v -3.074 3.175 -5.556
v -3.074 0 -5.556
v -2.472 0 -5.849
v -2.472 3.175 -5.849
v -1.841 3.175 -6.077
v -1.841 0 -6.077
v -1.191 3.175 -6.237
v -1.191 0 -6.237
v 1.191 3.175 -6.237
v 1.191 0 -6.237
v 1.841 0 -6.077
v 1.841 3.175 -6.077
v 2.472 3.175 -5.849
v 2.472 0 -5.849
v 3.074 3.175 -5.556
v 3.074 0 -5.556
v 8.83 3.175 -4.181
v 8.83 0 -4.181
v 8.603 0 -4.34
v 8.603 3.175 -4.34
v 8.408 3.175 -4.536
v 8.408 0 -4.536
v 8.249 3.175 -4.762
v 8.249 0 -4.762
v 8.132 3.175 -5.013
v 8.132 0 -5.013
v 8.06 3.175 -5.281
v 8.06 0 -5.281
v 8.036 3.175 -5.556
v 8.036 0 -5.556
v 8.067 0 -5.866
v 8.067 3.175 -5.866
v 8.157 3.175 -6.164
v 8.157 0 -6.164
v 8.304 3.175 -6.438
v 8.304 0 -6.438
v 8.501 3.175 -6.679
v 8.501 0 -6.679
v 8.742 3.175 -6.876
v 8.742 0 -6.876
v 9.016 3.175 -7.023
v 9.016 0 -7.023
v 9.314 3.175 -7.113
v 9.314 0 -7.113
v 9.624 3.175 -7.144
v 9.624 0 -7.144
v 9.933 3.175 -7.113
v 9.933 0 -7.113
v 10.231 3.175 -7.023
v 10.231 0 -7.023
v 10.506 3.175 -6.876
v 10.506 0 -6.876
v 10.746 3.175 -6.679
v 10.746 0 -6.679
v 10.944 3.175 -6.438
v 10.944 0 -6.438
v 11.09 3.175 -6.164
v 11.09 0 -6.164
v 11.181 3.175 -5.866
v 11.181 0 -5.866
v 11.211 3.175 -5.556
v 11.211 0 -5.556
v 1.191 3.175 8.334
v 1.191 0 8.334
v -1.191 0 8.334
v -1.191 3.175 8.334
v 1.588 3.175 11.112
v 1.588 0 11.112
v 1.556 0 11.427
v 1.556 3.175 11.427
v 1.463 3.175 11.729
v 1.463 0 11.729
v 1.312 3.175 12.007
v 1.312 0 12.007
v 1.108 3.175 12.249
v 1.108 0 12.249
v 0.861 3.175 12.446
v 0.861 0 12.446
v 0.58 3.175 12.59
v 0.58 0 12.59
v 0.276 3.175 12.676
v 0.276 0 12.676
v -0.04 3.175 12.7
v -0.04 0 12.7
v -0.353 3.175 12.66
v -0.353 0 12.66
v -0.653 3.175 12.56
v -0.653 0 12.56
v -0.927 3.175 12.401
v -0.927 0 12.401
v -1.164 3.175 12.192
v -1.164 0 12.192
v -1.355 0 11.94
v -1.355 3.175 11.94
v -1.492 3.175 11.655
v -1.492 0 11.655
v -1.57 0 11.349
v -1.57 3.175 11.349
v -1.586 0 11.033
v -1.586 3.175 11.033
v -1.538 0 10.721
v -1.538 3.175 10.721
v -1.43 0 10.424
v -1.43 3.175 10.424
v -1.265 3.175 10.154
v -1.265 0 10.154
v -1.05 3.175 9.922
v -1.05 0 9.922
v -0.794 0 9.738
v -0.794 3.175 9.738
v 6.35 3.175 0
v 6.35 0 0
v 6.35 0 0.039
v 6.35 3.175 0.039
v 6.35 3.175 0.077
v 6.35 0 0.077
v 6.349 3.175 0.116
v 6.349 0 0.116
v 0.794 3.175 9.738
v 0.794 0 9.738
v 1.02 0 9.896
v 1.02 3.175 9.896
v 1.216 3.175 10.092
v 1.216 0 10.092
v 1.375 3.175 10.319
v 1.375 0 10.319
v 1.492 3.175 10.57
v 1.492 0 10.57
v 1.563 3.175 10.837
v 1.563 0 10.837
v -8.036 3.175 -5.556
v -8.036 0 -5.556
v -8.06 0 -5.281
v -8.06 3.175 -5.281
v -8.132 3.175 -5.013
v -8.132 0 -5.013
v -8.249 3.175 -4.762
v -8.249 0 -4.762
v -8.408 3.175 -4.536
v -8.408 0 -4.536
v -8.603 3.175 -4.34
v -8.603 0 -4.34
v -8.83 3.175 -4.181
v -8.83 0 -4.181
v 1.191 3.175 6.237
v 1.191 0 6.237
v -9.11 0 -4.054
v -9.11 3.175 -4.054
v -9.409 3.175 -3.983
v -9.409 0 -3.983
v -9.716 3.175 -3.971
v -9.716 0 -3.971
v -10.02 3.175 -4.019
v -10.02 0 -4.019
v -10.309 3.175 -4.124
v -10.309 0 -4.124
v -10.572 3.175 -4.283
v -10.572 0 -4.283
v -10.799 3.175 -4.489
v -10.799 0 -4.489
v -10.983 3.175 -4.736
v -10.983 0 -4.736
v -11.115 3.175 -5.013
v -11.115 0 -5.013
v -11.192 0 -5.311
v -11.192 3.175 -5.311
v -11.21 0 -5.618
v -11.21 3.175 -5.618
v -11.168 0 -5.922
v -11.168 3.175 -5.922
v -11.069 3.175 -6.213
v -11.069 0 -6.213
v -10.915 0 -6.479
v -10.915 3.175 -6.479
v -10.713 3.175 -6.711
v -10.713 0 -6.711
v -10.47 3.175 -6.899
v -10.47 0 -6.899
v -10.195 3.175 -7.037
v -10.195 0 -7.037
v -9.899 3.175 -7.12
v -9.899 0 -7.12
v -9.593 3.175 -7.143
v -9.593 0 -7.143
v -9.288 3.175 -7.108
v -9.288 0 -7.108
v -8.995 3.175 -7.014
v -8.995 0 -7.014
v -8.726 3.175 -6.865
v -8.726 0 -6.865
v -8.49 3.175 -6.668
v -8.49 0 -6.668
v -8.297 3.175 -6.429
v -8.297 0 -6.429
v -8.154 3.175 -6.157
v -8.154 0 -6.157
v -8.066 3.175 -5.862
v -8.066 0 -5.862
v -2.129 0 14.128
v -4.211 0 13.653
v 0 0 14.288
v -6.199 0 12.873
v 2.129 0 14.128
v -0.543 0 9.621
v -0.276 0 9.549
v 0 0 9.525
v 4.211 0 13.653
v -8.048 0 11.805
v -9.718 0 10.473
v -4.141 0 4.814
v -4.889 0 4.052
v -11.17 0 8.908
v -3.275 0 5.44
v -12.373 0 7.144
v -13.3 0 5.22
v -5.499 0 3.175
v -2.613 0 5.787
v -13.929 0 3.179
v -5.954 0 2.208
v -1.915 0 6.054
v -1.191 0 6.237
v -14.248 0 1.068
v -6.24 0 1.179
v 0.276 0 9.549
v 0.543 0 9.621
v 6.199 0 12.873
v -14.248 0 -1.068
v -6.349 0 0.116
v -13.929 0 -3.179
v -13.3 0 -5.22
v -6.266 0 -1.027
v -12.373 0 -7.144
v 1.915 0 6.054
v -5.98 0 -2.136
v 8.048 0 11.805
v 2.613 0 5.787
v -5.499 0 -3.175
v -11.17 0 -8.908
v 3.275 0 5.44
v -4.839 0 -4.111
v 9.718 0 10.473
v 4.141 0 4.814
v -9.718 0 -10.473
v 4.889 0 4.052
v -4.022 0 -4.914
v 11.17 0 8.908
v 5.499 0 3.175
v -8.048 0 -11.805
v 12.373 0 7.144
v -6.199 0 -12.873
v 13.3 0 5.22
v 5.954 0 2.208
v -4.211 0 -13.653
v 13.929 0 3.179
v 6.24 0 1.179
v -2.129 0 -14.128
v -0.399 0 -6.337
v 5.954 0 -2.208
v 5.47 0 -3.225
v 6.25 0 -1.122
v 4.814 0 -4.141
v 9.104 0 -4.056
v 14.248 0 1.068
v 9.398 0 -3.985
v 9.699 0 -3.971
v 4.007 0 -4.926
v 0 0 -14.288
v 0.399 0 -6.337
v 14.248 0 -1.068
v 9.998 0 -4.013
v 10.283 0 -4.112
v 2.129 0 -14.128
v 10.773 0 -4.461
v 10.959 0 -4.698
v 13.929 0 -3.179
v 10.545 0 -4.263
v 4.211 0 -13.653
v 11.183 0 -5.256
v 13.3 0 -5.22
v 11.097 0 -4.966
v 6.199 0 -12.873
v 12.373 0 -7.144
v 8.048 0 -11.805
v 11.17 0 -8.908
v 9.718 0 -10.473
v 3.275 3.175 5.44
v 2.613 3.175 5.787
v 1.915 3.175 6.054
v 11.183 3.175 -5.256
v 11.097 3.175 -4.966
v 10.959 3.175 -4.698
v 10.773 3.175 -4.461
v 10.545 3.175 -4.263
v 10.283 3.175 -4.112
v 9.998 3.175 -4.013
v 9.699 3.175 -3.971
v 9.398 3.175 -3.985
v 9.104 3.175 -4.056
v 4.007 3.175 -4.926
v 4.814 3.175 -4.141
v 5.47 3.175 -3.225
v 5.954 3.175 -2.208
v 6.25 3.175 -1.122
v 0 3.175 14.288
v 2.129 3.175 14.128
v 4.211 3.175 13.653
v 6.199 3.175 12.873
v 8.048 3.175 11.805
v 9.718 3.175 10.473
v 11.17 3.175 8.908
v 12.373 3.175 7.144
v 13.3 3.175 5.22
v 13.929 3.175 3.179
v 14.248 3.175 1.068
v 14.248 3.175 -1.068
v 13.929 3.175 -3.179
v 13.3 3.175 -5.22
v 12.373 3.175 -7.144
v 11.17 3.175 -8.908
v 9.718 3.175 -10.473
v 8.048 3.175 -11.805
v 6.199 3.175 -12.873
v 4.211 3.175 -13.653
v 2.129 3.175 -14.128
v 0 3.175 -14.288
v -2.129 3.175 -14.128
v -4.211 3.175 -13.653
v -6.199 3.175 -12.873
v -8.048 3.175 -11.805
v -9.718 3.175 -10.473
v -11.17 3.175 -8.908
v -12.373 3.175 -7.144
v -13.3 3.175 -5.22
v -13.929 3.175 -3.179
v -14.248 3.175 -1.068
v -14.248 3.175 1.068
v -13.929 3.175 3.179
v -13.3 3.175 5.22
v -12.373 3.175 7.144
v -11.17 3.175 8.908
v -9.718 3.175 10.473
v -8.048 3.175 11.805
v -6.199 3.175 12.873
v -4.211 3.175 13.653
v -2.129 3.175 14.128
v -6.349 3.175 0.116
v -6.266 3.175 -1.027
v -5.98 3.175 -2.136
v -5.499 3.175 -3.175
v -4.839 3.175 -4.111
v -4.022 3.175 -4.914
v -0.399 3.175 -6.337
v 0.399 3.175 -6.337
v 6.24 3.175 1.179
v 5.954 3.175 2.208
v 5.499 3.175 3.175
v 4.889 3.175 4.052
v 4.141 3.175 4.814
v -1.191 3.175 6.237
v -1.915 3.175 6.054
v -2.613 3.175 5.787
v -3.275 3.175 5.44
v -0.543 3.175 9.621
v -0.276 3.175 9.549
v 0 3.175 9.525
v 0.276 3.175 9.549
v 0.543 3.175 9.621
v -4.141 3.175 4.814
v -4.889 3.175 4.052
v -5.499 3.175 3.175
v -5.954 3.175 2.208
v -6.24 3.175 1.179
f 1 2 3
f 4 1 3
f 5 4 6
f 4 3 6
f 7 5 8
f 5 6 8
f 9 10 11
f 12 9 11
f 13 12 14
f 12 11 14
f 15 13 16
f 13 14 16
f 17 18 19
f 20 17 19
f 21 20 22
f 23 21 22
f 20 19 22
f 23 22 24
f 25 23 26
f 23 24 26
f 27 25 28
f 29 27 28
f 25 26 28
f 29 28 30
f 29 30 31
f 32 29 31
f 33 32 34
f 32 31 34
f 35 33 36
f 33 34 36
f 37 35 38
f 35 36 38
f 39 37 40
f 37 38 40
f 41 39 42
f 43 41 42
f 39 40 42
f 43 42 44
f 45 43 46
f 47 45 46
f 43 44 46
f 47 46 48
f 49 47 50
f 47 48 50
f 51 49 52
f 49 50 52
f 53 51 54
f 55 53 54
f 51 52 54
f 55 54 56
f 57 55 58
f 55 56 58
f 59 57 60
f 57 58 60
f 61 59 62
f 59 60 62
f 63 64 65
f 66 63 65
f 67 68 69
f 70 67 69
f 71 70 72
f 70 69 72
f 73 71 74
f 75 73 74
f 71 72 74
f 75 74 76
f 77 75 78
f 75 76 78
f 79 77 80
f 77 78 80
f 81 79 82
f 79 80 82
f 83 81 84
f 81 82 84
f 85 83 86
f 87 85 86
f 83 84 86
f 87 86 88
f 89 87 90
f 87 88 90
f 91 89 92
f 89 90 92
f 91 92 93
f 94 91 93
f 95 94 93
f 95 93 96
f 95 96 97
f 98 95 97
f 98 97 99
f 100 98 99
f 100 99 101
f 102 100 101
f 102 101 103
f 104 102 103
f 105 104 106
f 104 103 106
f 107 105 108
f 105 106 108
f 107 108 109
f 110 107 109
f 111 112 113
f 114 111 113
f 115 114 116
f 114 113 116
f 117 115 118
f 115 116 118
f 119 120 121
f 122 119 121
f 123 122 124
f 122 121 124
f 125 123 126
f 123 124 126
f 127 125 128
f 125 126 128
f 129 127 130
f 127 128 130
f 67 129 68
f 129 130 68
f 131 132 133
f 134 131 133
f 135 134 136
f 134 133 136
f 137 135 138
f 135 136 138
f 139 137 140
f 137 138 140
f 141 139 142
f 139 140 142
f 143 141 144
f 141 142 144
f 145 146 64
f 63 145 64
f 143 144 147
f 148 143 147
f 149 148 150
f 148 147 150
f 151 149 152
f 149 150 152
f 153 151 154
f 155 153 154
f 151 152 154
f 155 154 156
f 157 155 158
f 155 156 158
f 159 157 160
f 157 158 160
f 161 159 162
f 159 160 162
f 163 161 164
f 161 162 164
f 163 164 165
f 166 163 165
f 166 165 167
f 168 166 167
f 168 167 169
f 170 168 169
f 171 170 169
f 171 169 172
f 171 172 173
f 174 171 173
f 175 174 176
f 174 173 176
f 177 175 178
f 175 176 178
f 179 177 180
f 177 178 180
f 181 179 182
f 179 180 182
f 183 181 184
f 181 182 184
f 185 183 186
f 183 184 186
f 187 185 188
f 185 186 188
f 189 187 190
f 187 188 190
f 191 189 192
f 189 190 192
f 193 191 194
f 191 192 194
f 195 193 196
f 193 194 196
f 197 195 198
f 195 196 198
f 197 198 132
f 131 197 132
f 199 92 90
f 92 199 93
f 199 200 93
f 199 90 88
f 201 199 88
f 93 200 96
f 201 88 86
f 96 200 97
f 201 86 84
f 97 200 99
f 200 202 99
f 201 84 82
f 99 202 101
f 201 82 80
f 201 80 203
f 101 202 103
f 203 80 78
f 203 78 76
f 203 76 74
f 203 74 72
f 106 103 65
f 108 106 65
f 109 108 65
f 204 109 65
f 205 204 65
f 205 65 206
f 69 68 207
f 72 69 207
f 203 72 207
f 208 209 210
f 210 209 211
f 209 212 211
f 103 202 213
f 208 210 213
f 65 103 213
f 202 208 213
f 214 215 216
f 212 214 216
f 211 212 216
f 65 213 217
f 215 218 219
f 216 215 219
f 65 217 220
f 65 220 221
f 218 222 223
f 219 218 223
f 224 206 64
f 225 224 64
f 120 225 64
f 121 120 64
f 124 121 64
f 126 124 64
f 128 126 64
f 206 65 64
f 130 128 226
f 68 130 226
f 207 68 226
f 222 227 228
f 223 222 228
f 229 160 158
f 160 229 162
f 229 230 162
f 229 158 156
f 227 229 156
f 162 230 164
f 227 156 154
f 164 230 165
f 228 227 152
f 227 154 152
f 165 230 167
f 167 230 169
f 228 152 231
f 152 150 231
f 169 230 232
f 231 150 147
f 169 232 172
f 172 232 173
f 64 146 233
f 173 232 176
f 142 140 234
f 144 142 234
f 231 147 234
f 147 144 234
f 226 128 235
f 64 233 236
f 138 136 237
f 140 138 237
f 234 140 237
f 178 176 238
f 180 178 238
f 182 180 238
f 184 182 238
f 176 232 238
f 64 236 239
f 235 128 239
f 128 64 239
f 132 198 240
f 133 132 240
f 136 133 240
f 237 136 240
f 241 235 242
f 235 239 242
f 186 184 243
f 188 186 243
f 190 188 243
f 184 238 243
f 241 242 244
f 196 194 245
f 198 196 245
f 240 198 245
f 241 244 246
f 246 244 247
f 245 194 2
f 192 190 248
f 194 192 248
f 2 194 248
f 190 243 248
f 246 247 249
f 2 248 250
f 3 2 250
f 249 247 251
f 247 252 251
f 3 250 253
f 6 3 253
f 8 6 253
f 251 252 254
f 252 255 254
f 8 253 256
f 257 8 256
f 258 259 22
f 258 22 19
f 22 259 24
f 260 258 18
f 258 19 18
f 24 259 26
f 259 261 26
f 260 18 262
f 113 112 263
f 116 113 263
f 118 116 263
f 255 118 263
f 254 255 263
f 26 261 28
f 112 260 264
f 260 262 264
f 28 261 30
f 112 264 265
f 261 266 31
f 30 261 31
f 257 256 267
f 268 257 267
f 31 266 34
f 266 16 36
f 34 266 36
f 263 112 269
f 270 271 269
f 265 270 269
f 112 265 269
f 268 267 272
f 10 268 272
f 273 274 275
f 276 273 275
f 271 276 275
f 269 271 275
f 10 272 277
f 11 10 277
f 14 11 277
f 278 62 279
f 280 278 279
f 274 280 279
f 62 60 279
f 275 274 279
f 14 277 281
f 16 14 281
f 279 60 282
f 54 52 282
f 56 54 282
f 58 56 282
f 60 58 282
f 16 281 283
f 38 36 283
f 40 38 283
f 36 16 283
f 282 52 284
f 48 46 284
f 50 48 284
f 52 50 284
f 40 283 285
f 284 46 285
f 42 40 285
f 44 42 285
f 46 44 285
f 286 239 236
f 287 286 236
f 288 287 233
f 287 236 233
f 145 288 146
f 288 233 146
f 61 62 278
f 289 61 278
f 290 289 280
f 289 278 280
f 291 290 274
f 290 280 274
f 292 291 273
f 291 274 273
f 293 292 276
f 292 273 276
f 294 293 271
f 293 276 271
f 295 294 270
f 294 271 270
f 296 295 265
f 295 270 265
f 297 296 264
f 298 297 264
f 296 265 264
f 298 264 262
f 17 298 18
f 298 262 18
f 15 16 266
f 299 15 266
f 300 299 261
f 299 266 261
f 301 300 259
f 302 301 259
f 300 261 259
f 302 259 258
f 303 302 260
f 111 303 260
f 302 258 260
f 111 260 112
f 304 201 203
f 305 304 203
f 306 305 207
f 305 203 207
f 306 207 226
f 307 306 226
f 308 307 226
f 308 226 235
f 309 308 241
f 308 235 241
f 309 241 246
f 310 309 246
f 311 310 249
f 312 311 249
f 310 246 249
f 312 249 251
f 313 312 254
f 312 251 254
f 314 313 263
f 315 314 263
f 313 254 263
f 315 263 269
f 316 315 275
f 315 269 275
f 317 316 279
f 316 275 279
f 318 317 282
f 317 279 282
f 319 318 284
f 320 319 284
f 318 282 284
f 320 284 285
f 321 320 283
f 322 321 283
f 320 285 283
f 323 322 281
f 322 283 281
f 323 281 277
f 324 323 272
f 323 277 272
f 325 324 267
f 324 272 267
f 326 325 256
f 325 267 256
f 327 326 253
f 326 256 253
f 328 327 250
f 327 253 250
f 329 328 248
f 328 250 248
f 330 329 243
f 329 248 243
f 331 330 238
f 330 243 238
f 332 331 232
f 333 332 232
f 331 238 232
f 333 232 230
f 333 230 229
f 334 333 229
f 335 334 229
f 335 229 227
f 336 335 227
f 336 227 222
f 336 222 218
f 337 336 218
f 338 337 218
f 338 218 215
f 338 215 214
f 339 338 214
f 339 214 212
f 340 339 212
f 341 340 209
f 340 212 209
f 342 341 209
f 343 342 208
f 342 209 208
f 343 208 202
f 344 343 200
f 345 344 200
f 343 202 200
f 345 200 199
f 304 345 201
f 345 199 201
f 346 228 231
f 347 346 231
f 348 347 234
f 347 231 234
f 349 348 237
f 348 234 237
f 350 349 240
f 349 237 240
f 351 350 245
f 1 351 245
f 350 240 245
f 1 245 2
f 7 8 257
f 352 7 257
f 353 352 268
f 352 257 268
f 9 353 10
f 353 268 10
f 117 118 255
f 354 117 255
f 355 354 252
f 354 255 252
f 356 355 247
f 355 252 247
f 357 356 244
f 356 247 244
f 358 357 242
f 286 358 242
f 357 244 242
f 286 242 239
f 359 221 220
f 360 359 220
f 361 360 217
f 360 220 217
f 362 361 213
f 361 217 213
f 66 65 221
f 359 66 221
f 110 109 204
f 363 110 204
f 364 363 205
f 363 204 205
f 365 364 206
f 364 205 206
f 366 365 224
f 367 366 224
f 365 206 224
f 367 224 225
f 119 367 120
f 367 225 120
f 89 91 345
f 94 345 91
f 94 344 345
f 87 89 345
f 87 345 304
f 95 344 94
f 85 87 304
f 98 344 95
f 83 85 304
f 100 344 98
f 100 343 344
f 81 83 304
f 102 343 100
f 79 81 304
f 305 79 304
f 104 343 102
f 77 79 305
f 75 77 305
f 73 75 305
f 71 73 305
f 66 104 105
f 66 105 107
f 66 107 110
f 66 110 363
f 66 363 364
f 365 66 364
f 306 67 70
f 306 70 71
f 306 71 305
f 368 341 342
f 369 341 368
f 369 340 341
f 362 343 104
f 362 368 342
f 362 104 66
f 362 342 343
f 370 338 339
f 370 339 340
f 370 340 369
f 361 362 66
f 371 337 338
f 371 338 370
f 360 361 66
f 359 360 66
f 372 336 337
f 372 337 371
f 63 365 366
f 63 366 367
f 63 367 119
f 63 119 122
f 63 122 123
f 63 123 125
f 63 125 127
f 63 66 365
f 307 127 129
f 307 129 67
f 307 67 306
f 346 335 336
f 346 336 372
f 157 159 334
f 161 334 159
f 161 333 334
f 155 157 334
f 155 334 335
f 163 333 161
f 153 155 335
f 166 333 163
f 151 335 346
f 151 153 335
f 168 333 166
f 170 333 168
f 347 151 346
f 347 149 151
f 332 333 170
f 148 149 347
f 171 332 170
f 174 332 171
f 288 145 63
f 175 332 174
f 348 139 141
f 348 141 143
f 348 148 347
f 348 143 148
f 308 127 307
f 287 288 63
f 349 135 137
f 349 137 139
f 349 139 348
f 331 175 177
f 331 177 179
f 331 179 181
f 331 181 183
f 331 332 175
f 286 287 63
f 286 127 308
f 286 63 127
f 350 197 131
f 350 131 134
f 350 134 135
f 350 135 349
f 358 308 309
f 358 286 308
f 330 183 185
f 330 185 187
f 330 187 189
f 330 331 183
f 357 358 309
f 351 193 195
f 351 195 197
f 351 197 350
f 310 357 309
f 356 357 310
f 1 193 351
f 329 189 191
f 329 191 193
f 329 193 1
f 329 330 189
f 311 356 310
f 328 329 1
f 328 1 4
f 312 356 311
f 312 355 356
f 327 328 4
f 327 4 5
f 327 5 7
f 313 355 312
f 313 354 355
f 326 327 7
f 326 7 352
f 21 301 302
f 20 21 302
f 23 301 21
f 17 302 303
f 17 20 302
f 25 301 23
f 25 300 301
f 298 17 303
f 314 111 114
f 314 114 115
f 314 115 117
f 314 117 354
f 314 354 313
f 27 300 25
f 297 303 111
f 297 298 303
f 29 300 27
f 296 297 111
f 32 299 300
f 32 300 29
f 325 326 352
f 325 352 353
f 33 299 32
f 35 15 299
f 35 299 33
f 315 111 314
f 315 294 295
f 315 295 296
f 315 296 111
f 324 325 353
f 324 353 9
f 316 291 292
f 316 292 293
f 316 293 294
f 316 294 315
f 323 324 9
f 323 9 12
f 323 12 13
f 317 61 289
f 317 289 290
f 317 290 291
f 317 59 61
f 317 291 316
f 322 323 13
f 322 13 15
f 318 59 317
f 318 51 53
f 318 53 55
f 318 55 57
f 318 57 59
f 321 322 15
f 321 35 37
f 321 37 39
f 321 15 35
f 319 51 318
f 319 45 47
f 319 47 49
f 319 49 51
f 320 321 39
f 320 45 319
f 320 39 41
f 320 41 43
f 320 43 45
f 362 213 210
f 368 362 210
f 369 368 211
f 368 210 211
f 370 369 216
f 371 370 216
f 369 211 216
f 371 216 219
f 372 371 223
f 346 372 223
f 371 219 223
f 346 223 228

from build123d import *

# Parameters (mm, degrees)
SKETCH1_R           = 14.2875
BOSS_EXTRUDE2_DEPTH = 3.175


with BuildPart() as part:
    # Sketch1 → Boss-Extrude2 (new body)
    # profile 1 of 5: a face of its own
    with BuildSketch(Plane(origin=(0, 0, 0), x_dir=(1, 0, 0), z_dir=(0, 1, 0))):
        with Locations(Location((0, 0, 0), (0, 0, 270))):
            Circle(SKETCH1_R)
        with BuildLine():
            Line((-1.190625, 6.237380228), (-1.190625, 8.334375))
            Line((-1.190625, 8.334375), (1.190625, 8.334375))
            Line((1.190625, 8.334375), (1.190625, 6.237380228))
            ThreePointArc((1.190625, 6.237380228), (2.159427274, 5.971547023), (3.074180531, 5.55625))
            Line((3.074180531, 5.55625), (8.0362073, 5.55625))
            ThreePointArc((8.0362073, 5.55625), (9.6237073, 7.14375), (11.2112073, 5.55625))
            ThreePointArc((11.2112073, 5.55625), (10.4174573, 4.181434671), (8.8299573, 4.181434671))
            Line((8.8299573, 4.181434671), (6.348943915, -0.115806564))
            ThreePointArc((6.348943915, -0.115806564), (5.499261314, -3.175), (3.274763384, -5.440443436))
            Line((3.274763384, -5.440443436), (0.79375, -9.737684671))
            ThreePointArc((0.79375, -9.737684671), (1.374815329, -10.31875), (1.5875, -11.1125))
            ThreePointArc((1.5875, -11.1125), (-0.79375, -12.487315329), (-0.79375, -9.737684671))
            Line((-0.79375, -9.737684671), (-3.274763384, -5.440443436))
            ThreePointArc((-3.274763384, -5.440443436), (-5.499261314, -3.175), (-6.348943915, -0.115806564))
            Line((-6.348943915, -0.115806564), (-8.8299573, 4.181434671))
            ThreePointArc((-8.8299573, 4.181434671), (-10.998522628, 6.35), (-8.0362073, 5.55625))
            Line((-8.0362073, 5.55625), (-3.074180531, 5.55625))
            ThreePointArc((-3.074180531, 5.55625), (-2.159427274, 5.971547023), (-1.190625, 6.237380228))
        make_face(mode=Mode.SUBTRACT)
    # profile 2 of 5: a face of its own
    with BuildSketch(Plane(origin=(0, 0, 0), x_dir=(1, 0, 0), z_dir=(0, 1, 0))):
        with BuildLine():
            ThreePointArc((-6.348943915, -0.115806564), (-5.499261314, 3.175), (-3.074180531, 5.55625))
            Line((-3.074180531, 5.55625), (-8.0362073, 5.55625))
            ThreePointArc((-8.0362073, 5.55625), (-8.248891971, 4.7625), (-8.8299573, 4.181434671))
            Line((-8.8299573, 4.181434671), (-6.348943915, -0.115806564))
        make_face()
    # profile 3 of 5: a face of its own
    with BuildSketch(Plane(origin=(0, 0, 0), x_dir=(1, 0, 0), z_dir=(0, 1, 0))):
        with BuildLine():
            Line((8.0362073, 5.55625), (3.074180531, 5.55625))
            ThreePointArc((3.074180531, 5.55625), (5.470079815, 3.225015785), (6.35, 0))
            ThreePointArc((6.35, 0), (6.349735973, -0.05790569), (6.348943915, -0.115806564))
            Line((6.348943915, -0.115806564), (8.8299573, 4.181434671))
            ThreePointArc((8.8299573, 4.181434671), (8.248891971, 4.7625), (8.0362073, 5.55625))
        make_face()
    # profile 4 of 5: a face of its own
    with BuildSketch(Plane(origin=(0, 0, 0), x_dir=(1, 0, 0), z_dir=(0, 1, 0))):
        with BuildLine():
            Line((-1.190625, -8.334375), (-1.190625, -6.237380228))
            ThreePointArc((-1.190625, -6.237380228), (-2.267972755, -5.931171856), (-3.274763384, -5.440443436))
            Line((-3.274763384, -5.440443436), (-0.79375, -9.737684671))
            ThreePointArc((-0.79375, -9.737684671), (0, -9.525), (0.79375, -9.737684671))
            Line((0.79375, -9.737684671), (3.274763384, -5.440443436))
            ThreePointArc((3.274763384, -5.440443436), (2.267972755, -5.931171856), (1.190625, -6.237380228))
            Line((1.190625, -6.237380228), (1.190625, -8.334375))
            Line((1.190625, -8.334375), (-1.190625, -8.334375))
        make_face()
    # profile 5 of 5: a face of its own
    with BuildSketch(Plane(origin=(0, 0, 0), x_dir=(1, 0, 0), z_dir=(0, 1, 0))):
        with BuildLine():
            Line((1.190625, 8.334375), (-1.190625, 8.334375))
            Line((-1.190625, 8.334375), (-1.190625, 6.237380228))
            ThreePointArc((-1.190625, 6.237380228), (0, 6.35), (1.190625, 6.237380228))
            Line((1.190625, 6.237380228), (1.190625, 8.334375))
        make_face()
    extrude(amount=BOSS_EXTRUDE2_DEPTH)


solid = part.part
